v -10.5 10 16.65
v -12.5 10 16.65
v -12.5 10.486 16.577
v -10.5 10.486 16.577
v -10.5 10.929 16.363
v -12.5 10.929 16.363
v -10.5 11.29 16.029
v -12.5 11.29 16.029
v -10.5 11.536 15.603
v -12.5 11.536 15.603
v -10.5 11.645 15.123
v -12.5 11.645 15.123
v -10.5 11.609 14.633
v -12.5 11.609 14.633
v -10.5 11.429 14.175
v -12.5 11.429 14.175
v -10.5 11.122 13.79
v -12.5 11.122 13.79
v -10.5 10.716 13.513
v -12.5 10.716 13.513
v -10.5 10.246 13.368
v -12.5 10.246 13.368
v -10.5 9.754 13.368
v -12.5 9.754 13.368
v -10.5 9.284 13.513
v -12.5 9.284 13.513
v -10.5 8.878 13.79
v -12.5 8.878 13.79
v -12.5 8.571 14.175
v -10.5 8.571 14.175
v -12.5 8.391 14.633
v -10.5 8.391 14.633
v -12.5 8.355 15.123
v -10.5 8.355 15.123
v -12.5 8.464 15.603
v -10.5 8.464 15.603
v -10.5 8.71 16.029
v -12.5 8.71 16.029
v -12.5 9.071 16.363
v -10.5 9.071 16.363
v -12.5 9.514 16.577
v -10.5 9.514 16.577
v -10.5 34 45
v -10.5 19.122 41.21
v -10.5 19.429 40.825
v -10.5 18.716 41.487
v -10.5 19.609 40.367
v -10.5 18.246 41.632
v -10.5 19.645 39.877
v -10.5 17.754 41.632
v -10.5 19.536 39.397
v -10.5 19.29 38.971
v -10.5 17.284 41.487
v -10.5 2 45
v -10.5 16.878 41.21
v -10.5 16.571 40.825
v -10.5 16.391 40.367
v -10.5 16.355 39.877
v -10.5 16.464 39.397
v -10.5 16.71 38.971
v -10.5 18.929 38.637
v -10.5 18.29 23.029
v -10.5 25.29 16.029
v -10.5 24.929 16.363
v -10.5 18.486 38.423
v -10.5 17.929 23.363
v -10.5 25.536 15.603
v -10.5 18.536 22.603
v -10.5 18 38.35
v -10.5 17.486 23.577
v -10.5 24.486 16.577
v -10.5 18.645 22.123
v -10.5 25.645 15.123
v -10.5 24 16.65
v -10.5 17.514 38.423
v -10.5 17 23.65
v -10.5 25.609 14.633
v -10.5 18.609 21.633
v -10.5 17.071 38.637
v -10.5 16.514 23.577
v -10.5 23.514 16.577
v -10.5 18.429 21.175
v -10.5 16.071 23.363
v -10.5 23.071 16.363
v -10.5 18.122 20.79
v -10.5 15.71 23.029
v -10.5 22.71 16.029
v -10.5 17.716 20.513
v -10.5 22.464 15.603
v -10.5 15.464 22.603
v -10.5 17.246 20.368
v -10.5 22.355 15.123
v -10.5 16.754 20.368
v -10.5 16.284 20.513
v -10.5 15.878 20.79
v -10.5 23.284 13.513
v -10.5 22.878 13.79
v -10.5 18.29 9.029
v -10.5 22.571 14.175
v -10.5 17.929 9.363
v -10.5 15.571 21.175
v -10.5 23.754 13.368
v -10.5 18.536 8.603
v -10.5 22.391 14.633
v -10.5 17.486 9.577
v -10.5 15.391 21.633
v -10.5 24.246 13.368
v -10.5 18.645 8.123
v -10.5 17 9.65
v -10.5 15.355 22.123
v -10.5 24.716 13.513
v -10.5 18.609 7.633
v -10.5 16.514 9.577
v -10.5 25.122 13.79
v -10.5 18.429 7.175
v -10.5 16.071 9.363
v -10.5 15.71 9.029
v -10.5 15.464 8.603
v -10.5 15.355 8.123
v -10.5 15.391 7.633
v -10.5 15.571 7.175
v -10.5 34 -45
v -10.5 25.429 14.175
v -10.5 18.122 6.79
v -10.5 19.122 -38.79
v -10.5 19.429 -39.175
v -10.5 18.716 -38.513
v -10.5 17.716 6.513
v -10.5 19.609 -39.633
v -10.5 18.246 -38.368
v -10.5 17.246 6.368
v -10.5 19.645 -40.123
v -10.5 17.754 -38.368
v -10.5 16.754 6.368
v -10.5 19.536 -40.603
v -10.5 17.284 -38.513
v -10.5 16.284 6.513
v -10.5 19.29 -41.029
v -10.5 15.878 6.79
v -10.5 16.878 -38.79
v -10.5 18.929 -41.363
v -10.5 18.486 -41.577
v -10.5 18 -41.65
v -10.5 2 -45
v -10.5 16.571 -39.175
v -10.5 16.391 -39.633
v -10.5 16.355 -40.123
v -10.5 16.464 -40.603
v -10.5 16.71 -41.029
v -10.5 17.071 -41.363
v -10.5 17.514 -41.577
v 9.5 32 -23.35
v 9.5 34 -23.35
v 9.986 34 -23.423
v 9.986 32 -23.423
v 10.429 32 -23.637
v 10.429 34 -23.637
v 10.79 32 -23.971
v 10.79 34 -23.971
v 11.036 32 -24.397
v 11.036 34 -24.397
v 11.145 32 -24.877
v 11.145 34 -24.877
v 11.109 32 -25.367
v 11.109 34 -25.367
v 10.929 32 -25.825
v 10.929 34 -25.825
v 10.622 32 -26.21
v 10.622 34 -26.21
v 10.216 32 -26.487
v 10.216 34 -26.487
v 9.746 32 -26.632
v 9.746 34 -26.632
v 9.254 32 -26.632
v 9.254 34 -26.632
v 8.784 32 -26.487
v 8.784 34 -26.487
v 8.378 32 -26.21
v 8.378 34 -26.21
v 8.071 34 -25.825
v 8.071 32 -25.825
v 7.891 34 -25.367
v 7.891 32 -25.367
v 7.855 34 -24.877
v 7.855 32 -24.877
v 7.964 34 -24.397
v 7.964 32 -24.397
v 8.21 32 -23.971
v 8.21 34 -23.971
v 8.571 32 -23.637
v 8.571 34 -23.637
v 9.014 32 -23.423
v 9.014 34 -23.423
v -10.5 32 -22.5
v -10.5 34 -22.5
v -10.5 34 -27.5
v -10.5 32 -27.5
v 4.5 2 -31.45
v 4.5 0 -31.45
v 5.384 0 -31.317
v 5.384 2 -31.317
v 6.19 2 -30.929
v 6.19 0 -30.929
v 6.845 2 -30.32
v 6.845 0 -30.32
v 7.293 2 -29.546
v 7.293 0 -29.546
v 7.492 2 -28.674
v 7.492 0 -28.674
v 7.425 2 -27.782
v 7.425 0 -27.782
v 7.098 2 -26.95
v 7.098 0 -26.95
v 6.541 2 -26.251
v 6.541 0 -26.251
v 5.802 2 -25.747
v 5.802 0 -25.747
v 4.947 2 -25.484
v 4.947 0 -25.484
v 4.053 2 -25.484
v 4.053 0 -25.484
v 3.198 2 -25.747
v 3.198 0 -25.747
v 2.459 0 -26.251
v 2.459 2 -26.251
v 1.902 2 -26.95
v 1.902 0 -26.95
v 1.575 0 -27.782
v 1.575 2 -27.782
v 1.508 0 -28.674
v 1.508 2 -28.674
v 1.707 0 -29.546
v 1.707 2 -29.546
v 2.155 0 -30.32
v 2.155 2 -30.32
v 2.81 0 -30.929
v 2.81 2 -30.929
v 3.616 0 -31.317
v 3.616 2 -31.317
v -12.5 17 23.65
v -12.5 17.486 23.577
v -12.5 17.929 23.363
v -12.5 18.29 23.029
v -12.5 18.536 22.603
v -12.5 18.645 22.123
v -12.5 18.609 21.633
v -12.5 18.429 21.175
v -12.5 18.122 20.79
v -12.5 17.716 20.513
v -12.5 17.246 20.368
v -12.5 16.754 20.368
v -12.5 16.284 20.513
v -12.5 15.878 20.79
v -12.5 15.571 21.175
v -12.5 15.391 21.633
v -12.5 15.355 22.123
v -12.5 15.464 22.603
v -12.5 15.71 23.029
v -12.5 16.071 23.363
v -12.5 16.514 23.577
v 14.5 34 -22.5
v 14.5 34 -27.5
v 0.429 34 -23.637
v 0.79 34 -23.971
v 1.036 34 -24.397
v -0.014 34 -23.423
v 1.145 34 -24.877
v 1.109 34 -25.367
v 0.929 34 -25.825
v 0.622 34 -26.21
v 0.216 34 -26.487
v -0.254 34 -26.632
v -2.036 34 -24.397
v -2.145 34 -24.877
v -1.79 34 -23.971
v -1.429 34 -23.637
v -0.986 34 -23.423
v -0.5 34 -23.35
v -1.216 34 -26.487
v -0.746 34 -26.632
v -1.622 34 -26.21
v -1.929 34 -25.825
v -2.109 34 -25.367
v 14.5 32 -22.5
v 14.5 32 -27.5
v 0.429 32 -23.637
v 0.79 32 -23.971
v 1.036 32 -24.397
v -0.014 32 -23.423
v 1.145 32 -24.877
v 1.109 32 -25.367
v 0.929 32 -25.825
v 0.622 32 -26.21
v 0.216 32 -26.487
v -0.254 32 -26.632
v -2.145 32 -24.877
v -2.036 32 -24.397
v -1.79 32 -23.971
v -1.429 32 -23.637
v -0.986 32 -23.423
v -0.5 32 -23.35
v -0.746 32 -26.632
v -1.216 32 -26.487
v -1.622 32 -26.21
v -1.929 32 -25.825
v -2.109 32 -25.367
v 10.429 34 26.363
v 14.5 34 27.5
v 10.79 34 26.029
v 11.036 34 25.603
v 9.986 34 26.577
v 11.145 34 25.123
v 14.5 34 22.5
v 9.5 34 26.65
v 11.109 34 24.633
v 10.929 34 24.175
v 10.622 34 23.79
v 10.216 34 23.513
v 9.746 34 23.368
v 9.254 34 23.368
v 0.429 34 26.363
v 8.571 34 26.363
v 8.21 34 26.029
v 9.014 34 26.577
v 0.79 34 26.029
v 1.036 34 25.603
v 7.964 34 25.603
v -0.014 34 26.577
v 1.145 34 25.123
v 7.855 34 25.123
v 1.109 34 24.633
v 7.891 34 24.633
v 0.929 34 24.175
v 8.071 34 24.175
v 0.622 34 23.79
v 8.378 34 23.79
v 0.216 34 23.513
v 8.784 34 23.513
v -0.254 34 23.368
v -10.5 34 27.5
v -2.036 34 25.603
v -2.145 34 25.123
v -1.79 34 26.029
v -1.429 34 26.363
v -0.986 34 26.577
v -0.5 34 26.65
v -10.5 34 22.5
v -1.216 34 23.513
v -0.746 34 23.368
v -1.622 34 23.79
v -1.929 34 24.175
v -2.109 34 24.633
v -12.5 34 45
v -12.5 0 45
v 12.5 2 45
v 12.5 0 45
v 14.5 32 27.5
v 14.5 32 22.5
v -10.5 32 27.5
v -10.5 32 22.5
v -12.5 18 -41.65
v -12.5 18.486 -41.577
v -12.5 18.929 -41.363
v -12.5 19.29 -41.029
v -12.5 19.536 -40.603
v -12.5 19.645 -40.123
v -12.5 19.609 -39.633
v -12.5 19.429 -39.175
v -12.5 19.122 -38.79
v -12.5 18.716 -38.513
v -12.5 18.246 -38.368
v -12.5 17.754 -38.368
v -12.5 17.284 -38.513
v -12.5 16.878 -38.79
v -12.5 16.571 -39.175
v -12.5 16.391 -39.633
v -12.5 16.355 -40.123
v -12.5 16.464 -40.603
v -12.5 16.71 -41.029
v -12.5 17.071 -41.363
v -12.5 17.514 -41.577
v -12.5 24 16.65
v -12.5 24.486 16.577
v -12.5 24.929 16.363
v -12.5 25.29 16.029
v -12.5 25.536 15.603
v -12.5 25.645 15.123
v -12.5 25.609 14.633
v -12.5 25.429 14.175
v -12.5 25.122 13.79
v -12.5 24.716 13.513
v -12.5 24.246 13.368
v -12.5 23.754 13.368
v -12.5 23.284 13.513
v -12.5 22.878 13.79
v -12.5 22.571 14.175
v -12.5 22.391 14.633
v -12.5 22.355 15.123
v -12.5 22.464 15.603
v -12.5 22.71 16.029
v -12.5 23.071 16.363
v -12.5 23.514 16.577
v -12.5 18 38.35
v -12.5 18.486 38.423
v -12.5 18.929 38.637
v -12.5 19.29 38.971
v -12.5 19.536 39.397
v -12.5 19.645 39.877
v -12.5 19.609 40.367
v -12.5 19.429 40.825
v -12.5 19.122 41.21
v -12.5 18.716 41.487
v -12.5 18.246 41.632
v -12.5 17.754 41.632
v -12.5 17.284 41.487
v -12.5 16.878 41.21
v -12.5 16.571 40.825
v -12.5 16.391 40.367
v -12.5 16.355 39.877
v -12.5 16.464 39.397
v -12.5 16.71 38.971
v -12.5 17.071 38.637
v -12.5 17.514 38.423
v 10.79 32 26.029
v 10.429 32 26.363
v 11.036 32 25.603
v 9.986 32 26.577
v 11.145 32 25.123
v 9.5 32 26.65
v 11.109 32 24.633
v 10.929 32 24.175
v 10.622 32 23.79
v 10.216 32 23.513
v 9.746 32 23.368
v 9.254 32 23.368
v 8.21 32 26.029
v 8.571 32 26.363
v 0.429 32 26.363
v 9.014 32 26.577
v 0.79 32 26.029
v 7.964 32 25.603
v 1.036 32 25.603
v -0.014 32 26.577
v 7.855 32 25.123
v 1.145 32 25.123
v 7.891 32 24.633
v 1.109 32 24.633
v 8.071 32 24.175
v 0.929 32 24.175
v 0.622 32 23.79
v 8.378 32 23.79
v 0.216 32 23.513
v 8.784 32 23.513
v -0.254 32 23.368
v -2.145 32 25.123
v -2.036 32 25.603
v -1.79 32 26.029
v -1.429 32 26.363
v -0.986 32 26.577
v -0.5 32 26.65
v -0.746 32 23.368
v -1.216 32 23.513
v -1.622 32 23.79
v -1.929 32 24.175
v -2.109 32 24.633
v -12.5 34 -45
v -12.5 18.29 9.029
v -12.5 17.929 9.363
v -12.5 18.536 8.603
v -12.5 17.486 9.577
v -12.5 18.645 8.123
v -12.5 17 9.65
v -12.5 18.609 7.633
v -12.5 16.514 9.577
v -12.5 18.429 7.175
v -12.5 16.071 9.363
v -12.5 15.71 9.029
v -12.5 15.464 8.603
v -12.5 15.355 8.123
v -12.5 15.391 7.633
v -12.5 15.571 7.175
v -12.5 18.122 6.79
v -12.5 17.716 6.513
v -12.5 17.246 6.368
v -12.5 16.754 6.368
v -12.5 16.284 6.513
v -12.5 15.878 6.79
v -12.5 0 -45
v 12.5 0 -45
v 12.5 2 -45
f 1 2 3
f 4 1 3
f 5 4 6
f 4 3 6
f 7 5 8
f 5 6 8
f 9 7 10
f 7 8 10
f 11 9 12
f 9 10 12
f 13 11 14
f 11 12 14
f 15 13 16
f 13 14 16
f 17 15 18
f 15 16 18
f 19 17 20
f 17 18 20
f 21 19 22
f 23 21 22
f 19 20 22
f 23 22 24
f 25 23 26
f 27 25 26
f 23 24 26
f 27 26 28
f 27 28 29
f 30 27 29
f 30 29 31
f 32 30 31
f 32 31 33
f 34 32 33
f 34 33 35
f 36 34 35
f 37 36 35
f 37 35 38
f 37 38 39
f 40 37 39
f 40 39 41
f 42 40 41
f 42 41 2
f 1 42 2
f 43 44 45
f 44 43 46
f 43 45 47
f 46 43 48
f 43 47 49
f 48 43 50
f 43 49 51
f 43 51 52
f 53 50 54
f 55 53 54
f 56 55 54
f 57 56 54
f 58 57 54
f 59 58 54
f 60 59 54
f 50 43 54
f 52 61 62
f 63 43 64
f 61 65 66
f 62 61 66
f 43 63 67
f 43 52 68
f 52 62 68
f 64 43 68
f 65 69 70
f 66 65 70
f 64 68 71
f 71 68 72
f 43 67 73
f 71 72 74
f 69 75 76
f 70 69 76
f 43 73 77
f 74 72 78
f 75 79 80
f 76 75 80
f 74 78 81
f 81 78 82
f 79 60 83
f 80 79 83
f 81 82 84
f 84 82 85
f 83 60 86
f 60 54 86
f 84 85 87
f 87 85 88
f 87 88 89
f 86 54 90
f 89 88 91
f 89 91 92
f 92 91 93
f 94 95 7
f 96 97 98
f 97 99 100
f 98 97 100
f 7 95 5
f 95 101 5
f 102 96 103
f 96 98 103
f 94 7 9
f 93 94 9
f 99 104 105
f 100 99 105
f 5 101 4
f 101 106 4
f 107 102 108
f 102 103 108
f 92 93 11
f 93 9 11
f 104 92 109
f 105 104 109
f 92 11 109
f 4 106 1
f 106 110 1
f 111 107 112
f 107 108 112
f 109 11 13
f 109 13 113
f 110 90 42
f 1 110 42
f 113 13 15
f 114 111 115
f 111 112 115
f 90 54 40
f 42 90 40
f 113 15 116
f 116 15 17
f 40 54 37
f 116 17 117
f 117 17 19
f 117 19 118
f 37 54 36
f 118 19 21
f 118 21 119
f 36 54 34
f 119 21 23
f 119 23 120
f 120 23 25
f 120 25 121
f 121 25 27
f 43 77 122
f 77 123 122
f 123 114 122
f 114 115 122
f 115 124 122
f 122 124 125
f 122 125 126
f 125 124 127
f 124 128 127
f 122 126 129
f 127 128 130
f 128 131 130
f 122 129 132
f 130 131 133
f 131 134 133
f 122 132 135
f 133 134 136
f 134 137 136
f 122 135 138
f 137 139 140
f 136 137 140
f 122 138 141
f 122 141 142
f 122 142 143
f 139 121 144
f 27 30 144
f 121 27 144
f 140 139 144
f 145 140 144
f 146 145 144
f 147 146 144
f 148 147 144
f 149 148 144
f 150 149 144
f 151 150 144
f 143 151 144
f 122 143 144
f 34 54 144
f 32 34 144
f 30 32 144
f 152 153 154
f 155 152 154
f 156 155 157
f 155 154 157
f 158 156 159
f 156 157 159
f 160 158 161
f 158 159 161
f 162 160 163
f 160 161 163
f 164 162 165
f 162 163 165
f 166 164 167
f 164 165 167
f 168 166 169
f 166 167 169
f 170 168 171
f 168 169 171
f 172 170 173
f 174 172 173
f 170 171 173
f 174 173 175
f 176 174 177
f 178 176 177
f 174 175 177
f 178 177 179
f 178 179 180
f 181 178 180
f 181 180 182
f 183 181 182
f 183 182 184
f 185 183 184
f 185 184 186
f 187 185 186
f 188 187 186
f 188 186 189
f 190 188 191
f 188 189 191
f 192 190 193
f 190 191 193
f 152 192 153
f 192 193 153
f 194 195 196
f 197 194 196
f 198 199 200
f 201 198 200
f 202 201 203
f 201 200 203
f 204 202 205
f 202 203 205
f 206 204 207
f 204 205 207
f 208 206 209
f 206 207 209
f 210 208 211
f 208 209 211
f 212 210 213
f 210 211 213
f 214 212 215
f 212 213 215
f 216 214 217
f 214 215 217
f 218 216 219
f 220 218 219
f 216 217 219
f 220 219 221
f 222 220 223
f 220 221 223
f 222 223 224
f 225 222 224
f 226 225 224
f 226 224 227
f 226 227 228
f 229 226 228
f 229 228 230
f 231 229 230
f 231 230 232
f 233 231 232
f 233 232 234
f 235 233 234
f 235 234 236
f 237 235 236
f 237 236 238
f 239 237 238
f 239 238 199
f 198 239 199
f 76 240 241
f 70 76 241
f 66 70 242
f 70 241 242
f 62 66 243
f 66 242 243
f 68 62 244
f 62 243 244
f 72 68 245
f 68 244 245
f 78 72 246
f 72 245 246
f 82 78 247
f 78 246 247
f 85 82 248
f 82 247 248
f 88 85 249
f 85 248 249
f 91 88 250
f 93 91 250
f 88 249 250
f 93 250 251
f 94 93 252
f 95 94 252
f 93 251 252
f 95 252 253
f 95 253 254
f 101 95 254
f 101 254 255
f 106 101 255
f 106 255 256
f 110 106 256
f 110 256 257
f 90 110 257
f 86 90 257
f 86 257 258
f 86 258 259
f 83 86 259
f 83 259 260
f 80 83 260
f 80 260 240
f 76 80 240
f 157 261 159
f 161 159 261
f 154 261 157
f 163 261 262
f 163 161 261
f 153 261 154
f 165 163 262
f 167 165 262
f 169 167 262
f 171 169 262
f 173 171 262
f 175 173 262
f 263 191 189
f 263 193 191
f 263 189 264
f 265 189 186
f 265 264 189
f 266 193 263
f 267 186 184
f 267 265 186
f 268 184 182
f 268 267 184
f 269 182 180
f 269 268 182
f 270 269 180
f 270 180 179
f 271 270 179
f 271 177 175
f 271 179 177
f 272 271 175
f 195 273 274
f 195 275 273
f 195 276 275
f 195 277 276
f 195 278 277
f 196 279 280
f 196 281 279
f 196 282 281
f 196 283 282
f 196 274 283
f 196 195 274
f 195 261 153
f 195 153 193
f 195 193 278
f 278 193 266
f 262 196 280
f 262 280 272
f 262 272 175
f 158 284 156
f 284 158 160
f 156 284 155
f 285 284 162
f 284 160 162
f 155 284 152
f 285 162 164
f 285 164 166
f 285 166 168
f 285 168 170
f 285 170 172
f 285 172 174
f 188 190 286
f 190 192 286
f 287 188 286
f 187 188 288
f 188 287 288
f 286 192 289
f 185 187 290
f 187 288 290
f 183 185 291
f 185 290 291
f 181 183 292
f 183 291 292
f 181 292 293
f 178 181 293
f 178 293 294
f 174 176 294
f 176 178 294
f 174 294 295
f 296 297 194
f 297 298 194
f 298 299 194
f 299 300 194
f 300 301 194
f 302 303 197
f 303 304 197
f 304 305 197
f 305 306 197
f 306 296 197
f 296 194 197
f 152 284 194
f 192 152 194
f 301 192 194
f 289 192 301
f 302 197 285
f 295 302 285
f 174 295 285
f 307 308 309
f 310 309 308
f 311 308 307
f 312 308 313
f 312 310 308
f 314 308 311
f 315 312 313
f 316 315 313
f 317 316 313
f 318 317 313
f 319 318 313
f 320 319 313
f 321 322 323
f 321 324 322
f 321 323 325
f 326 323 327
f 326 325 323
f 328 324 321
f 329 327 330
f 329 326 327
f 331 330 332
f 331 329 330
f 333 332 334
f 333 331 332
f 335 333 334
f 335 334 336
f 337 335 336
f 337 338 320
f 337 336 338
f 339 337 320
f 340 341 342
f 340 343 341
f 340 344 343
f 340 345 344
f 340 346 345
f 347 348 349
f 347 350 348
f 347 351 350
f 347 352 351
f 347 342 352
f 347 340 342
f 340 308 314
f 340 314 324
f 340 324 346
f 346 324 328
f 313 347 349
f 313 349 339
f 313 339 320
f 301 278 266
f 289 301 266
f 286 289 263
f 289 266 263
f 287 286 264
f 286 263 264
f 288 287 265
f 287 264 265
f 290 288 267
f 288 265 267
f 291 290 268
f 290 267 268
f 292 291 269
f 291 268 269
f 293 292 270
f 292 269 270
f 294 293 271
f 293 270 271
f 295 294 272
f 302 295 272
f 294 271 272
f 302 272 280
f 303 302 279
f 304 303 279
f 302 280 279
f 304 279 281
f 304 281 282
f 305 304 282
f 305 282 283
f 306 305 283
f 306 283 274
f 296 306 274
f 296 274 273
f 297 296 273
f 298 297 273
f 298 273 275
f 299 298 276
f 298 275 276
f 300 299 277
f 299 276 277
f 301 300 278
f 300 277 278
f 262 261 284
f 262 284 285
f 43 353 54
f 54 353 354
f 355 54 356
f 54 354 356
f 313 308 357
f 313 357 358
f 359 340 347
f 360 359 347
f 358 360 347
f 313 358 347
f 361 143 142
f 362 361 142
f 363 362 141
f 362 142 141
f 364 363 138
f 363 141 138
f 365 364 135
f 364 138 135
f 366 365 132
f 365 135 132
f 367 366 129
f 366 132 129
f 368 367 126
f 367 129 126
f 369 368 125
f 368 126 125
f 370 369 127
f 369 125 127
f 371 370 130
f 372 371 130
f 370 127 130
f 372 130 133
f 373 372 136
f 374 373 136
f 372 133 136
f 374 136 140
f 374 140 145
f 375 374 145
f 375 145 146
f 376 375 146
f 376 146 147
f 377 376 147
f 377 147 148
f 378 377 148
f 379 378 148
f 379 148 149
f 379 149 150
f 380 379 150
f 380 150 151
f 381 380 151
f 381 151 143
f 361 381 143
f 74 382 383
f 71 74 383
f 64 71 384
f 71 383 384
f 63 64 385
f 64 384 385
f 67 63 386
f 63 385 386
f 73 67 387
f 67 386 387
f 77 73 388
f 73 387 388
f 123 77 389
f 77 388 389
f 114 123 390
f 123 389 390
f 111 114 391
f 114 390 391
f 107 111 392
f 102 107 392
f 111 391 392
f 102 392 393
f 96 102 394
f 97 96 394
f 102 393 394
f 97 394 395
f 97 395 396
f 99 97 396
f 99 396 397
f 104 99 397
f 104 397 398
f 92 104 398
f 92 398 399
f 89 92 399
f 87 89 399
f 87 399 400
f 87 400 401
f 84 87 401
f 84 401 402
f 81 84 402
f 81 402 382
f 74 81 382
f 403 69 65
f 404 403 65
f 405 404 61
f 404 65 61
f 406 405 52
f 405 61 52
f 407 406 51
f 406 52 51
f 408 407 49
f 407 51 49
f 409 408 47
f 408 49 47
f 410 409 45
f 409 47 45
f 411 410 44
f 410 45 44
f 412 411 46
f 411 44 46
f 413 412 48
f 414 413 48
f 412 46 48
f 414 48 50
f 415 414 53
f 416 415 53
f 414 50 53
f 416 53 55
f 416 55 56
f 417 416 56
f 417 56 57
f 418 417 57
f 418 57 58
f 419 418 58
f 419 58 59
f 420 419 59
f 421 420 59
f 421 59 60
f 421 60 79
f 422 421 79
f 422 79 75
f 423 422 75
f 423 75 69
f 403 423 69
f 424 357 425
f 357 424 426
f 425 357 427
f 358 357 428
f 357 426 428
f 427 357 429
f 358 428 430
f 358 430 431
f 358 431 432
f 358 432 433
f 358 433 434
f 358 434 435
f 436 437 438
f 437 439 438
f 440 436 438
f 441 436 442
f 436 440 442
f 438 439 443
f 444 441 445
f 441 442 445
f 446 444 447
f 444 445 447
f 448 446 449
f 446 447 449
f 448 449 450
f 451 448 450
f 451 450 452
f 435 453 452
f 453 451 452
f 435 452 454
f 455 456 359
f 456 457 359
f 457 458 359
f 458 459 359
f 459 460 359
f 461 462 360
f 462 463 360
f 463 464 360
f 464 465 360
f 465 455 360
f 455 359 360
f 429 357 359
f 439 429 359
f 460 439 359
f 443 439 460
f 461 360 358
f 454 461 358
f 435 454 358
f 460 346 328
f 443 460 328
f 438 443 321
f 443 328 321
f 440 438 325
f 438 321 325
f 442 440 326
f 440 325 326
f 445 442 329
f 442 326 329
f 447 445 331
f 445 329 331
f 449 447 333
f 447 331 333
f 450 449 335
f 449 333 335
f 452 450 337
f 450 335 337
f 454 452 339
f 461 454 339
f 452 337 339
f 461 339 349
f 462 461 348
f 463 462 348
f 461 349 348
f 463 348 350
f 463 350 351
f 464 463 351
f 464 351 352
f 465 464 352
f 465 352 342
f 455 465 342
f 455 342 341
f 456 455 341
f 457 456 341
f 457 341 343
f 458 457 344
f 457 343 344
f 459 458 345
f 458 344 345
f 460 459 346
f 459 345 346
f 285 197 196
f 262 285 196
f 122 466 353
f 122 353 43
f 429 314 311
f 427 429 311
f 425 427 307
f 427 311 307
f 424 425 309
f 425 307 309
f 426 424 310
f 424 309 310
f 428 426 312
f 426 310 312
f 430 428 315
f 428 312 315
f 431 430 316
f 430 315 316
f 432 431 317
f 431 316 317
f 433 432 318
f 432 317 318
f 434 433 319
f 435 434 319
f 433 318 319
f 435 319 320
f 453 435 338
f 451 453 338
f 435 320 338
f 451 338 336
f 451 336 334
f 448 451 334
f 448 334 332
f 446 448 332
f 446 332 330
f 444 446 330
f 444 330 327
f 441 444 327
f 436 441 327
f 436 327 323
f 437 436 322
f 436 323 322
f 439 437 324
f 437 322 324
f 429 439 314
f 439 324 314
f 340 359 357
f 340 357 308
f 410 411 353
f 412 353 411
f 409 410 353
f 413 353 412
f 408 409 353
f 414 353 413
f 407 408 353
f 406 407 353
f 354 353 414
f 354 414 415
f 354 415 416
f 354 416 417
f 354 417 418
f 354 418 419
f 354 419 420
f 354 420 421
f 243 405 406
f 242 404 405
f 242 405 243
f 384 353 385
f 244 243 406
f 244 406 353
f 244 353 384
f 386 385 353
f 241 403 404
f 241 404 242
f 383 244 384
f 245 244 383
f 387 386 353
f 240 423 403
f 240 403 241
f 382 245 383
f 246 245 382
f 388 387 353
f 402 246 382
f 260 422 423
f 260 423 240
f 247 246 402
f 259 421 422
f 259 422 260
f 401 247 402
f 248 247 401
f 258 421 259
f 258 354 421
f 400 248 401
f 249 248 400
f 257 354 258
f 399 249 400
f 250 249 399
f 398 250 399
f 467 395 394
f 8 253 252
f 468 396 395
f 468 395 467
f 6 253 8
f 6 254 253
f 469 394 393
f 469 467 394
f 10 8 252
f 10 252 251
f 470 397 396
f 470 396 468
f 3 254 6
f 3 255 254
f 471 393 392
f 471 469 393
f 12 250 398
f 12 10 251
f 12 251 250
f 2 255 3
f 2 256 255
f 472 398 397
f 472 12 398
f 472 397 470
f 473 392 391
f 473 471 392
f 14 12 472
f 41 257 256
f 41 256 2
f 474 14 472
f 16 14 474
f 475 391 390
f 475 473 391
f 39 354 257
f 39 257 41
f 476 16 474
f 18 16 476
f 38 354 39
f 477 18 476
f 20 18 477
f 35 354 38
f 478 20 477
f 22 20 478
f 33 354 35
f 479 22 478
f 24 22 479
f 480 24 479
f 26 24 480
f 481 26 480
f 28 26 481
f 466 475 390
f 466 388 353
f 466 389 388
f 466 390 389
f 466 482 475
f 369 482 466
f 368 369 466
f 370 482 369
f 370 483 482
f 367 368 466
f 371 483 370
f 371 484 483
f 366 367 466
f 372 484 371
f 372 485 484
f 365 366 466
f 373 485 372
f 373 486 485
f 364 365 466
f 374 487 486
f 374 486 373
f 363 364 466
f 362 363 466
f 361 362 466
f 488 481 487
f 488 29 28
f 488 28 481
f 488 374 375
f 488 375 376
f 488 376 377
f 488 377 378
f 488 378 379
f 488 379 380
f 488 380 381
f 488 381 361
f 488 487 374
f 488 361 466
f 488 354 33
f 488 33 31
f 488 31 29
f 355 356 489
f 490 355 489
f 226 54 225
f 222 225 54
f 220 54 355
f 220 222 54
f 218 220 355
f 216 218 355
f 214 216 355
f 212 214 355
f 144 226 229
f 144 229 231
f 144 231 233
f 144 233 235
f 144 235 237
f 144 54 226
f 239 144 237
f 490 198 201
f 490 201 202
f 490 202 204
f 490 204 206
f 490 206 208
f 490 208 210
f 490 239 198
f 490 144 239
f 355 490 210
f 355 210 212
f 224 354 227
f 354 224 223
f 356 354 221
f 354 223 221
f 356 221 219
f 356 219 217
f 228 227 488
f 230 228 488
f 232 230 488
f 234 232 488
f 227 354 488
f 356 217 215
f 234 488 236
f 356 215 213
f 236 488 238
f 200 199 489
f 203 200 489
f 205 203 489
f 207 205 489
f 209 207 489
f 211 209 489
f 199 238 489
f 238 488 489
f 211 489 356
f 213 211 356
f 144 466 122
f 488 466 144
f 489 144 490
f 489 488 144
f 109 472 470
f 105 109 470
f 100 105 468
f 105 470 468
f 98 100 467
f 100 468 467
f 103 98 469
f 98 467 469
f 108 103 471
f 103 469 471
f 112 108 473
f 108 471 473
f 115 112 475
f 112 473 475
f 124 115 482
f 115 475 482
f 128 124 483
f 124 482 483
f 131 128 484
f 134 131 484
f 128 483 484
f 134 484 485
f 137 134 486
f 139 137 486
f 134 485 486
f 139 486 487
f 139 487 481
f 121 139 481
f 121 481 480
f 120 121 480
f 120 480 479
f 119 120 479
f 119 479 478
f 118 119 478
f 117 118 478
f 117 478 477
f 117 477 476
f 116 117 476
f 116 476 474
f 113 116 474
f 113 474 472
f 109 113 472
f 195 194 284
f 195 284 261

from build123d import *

# Parameters (mm, degrees)
SKETCH_1_W          = 25
SKETCH_1_H          = 90
EXTRUDE_1_DEPTH     = 2
SKETCH_3_W          = 2
SKETCH_3_H          = 90
EXTRUDE_2_DEPTH     = 32
SKETCH_4_W          = 5
SKETCH_4_H          = 2
EXTRUDE_3_DEPTH     = 25
EXTRUDE_3_2_DEPTH   = 25
SKETCH_5_R          = 1.65
CUT_EXTRUDE_2_DEPTH = 2
SKETCH_6_R          = 1.65
CUT_EXTRUDE_3_DEPTH = 10
SKETCH_7_R          = 3
CUT_EXTRUDE_4_DEPTH = 10
SKETCH_8_R          = 1.65
CUT_EXTRUDE_5_DEPTH = 10


with BuildPart() as part:
    # 草图1 → 凸台-拉伸1 (new body)
    with BuildSketch(Plane(origin=(0, 0, 0), x_dir=(1, 0, 0), z_dir=(0, 1, 0))):
        Rectangle(SKETCH_1_W, SKETCH_1_H)
    extrude(amount=EXTRUDE_1_DEPTH)

    # 草图3 → 凸台-拉伸2 (add)
    with BuildSketch(Plane(origin=(0, 2, 0), x_dir=(1, 0, 0), z_dir=(0, 1, 0))):
        with Locations((-11.5, 0)):
            Rectangle(SKETCH_3_W, SKETCH_3_H)
    extrude(amount=EXTRUDE_2_DEPTH)

    # 草图6 → 切除-拉伸3 (cut)
    with BuildSketch(Plane.ZY.offset(12.5)):
        with Locations((8, 17)):
            Circle(SKETCH_6_R)
        with Locations((22, 17)):
            Circle(SKETCH_6_R)
        with Locations((15, 10)):
            Circle(SKETCH_6_R)
        with Locations((15, 24)):
            Circle(SKETCH_6_R)
    extrude(amount=-CUT_EXTRUDE_3_DEPTH, mode=Mode.SUBTRACT)

    # 草图7 → 切除-拉伸4 (cut)
    with BuildSketch(Plane(origin=(0, 0, 0), x_dir=(-1, 0, 0), z_dir=(0, -1, 0))):
        with Locations(Location((-4.5, 28.45, 0), (0, 0, 90))):
            Circle(SKETCH_7_R)
    extrude(amount=-CUT_EXTRUDE_4_DEPTH, mode=Mode.SUBTRACT)

    # 草图8 → 切除-拉伸5 (cut)
    with BuildSketch(Plane(origin=(-10.5, 0, 0), x_dir=(0, 0, -1), z_dir=(1, 0, 0))):
        with Locations((-40, 18)):
            Circle(SKETCH_8_R)
        with Locations((40, 18)):
            Circle(SKETCH_8_R)
    extrude(amount=-CUT_EXTRUDE_5_DEPTH, mode=Mode.SUBTRACT)


with BuildPart() as body_2:
    # 草图4 → 凸台-拉伸3 (new body)
    with BuildSketch(Plane(origin=(-10.5, 0, 0), x_dir=(0, 0, -1), z_dir=(1, 0, 0))):
        with Locations((25, 33)):
            Rectangle(SKETCH_4_W, SKETCH_4_H)
    extrude(amount=EXTRUDE_3_DEPTH)


with BuildPart() as body_3:
    # 草图4 → Extrude 3 2 (new body)
    with BuildSketch(Plane(origin=(-10.5, 0, 0), x_dir=(0, 0, -1), z_dir=(1, 0, 0))):
        with Locations((-25, 33)):
            Rectangle(SKETCH_4_W, SKETCH_4_H)
    extrude(amount=EXTRUDE_3_2_DEPTH)


with BuildPart() as cut_extrude_2_tool:
    # 草图5 → 切除-拉伸2 (new body)
    with BuildSketch(Plane(origin=(0, 34, 0), x_dir=(1, 0, 0), z_dir=(0, 1, 0))):
        with Locations(Location((-0.5, -25, 0), (0, 0, 270))):
            Circle(SKETCH_5_R)
        with Locations(Location((9.5, -25, 0), (0, 0, 270))):
            Circle(SKETCH_5_R)
        with Locations(Location((9.5, 25, 0), (0, 0, 270))):
            Circle(SKETCH_5_R)
        with Locations(Location((-0.5, 25, 0), (0, 0, 270))):
            Circle(SKETCH_5_R)
    extrude(amount=-CUT_EXTRUDE_2_DEPTH)


with BuildPart() as body_2_1:
    add(body_2.part)

    # 切除-拉伸2: cut by cut_extrude_2_tool
    add(cut_extrude_2_tool.part, mode=Mode.SUBTRACT)


with BuildPart() as body_3_1:
    add(body_3.part)

    # 切除-拉伸2: cut by cut_extrude_2_tool
    add(cut_extrude_2_tool.part, mode=Mode.SUBTRACT)


solid = Compound([part.part, body_2_1.part, body_3_1.part])
